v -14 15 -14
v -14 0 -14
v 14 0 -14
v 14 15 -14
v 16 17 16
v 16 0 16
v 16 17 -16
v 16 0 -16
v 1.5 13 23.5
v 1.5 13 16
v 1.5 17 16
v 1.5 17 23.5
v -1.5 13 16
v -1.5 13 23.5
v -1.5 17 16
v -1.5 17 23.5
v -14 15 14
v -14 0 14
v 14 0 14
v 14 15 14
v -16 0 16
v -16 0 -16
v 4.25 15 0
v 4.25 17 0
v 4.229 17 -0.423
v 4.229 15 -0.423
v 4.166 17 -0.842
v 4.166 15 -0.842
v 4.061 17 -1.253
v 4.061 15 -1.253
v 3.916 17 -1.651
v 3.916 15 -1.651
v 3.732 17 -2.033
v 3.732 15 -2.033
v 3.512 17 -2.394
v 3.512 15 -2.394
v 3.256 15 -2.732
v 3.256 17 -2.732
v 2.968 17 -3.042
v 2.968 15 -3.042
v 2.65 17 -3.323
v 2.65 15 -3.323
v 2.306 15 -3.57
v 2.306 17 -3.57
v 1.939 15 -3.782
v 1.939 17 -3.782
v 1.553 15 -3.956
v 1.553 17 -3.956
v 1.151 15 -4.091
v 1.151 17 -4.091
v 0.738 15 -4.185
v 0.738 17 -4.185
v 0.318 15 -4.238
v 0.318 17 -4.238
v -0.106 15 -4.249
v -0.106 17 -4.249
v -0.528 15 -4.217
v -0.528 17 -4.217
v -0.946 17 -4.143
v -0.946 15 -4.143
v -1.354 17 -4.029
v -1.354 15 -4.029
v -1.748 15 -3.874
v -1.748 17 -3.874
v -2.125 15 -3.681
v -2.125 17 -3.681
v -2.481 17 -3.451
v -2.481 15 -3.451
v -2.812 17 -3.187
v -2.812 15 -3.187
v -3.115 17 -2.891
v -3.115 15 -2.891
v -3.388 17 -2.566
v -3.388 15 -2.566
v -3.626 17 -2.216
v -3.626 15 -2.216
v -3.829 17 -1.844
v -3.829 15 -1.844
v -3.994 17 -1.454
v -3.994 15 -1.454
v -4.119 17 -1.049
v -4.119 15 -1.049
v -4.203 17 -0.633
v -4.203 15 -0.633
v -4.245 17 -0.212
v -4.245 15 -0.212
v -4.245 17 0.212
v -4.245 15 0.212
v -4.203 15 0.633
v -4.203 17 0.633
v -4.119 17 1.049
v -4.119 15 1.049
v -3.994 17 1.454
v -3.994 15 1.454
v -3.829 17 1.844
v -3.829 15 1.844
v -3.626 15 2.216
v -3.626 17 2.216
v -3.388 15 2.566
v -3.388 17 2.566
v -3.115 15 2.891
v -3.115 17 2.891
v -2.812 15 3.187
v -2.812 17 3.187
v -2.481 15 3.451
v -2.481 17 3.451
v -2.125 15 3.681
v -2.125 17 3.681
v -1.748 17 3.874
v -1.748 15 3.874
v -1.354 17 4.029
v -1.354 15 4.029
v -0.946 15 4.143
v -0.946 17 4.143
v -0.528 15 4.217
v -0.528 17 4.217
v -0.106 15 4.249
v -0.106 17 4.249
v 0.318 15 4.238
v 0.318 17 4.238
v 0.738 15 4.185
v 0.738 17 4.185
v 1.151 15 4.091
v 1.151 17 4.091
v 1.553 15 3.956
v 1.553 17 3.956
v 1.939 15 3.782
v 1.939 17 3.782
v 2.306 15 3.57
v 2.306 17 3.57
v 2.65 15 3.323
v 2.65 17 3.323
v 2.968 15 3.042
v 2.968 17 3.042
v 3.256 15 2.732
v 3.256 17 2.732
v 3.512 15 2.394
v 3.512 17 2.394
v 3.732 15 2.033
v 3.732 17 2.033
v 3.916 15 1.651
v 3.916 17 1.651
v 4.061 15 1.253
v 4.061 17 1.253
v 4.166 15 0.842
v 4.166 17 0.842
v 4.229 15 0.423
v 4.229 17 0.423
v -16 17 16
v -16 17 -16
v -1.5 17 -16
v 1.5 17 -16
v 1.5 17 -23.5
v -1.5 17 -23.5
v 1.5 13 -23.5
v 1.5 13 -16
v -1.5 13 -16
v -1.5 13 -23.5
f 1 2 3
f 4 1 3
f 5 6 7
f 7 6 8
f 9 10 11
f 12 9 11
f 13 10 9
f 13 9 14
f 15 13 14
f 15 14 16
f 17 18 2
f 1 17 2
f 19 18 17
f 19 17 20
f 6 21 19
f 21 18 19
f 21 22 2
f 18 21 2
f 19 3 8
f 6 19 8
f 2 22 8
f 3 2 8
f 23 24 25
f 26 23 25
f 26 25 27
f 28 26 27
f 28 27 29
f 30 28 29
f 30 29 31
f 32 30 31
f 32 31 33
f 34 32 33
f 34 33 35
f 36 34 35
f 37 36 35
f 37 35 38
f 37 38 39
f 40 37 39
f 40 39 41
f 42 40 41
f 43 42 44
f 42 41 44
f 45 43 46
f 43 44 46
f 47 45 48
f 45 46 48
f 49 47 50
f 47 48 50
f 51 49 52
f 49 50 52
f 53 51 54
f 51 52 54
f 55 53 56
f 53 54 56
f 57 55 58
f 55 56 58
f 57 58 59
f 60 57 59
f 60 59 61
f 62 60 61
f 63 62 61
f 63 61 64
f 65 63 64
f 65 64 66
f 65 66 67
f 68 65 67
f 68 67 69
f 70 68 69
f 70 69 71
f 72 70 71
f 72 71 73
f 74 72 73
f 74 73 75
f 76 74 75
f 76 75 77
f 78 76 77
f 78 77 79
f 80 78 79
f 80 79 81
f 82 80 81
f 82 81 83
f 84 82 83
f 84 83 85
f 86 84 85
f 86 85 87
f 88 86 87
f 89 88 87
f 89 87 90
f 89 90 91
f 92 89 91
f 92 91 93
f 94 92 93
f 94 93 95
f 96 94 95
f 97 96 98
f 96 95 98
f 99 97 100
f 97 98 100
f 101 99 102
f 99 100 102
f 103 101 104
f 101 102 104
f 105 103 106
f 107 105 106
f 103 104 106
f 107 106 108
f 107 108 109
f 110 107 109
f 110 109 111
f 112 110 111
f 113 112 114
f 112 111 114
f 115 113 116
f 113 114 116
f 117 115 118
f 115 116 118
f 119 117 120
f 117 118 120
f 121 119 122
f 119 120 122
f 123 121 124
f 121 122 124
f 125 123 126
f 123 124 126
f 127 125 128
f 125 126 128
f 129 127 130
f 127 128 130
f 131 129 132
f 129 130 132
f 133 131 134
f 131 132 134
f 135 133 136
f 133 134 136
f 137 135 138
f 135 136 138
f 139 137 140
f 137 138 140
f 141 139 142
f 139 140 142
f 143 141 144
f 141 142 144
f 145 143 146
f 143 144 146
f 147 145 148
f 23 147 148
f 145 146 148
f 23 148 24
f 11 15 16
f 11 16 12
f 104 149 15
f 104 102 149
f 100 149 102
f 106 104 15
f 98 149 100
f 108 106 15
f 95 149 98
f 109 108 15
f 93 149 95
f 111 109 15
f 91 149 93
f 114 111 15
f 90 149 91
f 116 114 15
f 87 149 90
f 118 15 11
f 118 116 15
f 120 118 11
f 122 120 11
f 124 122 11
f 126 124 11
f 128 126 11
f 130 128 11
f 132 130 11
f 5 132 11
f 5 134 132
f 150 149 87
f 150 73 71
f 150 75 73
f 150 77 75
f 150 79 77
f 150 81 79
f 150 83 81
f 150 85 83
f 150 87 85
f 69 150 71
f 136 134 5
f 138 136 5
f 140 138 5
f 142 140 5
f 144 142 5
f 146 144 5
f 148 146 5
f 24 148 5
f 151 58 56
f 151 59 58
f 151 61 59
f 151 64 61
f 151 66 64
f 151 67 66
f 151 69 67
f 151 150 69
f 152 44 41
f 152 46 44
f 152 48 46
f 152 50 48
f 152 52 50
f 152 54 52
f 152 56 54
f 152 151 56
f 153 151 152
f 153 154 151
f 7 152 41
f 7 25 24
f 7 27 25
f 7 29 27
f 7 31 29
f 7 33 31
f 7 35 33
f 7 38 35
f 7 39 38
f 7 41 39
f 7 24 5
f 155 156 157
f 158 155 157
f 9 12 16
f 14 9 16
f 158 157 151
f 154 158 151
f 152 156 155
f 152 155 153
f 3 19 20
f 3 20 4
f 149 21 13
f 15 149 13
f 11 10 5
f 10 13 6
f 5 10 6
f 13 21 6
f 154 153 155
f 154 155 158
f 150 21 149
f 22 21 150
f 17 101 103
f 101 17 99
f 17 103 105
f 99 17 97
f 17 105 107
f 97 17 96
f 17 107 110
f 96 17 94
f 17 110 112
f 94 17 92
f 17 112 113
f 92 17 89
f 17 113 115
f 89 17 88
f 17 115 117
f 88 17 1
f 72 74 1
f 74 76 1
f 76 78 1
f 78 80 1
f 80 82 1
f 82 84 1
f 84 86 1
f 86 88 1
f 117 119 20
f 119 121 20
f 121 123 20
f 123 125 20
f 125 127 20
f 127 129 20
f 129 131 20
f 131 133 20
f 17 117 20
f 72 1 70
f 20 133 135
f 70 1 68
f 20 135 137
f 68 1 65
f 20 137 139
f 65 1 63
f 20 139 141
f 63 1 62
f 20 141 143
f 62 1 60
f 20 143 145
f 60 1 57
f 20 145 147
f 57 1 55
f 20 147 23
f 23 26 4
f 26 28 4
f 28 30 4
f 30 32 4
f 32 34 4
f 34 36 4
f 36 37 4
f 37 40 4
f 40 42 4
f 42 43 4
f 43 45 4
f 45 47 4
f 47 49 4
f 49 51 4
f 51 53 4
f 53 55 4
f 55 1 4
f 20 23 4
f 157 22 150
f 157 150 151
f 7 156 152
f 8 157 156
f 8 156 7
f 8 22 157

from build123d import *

# Parameters (mm, degrees)
SKETCH1_W           = 32
SKETCH1_H           = 32
SKETCH1_W_2         = 28
SKETCH1_H_2         = 28
BOSS_EXTRUDE1_DEPTH = 15
SKETCH2_W           = 32
SKETCH2_H           = 32
BOSS_EXTRUDE2_DEPTH = 2
CUT_EXTRUDE1_REACH  = 19
SKETCH3_R           = 4.25
SKETCH5_W           = 3
SKETCH5_H           = 4
BOSS_EXTRUDE3_DEPTH = 7.5


with BuildPart() as part:
    # Sketch1 → Boss-Extrude1 (new body)
    with BuildSketch(Plane(origin=(0, 0, 0), x_dir=(1, 0, 0), z_dir=(0, 1, 0))):
        Rectangle(SKETCH1_W, SKETCH1_H)
        Rectangle(SKETCH1_W_2, SKETCH1_H_2, mode=Mode.SUBTRACT)
    extrude(amount=BOSS_EXTRUDE1_DEPTH)

    # Sketch2 → Boss-Extrude2 (add)
    with BuildSketch(Plane(origin=(0, 15, 0), x_dir=(1, 0, 0), z_dir=(0, 1, 0))):
        Rectangle(SKETCH2_W, SKETCH2_H)
    extrude(amount=BOSS_EXTRUDE2_DEPTH)

    # Sketch3 → Cut-Extrude1 (cut, up to next)
    with BuildSketch(Plane(origin=(0, 17, 0), x_dir=(1, 0, 0), z_dir=(0, 1, 0)), mode=Mode.PRIVATE) as cut_extrude1_sk1:
        Circle(SKETCH3_R)
    cut_extrude1_tool1 = extrude(cut_extrude1_sk1.sketch, amount=-CUT_EXTRUDE1_REACH, mode=Mode.PRIVATE) & part.part
    add(cut_extrude1_tool1.solids().sort_by_distance((0, 17, 0))[0], mode=Mode.SUBTRACT)

    # Sketch5 → Boss-Extrude3 (add)
    with BuildSketch(Plane(origin=(0, 0, -16), x_dir=(-1, 0, 0), z_dir=(0, 0, -1))):
        with Locations((0, 15)):
            Rectangle(SKETCH5_W, SKETCH5_H)
    boss_extrude3 = extrude(amount=BOSS_EXTRUDE3_DEPTH)

    # Mirror1: Boss-Extrude3 across plane
    add(boss_extrude3.mirror(Plane.XY))


solid = part.part
